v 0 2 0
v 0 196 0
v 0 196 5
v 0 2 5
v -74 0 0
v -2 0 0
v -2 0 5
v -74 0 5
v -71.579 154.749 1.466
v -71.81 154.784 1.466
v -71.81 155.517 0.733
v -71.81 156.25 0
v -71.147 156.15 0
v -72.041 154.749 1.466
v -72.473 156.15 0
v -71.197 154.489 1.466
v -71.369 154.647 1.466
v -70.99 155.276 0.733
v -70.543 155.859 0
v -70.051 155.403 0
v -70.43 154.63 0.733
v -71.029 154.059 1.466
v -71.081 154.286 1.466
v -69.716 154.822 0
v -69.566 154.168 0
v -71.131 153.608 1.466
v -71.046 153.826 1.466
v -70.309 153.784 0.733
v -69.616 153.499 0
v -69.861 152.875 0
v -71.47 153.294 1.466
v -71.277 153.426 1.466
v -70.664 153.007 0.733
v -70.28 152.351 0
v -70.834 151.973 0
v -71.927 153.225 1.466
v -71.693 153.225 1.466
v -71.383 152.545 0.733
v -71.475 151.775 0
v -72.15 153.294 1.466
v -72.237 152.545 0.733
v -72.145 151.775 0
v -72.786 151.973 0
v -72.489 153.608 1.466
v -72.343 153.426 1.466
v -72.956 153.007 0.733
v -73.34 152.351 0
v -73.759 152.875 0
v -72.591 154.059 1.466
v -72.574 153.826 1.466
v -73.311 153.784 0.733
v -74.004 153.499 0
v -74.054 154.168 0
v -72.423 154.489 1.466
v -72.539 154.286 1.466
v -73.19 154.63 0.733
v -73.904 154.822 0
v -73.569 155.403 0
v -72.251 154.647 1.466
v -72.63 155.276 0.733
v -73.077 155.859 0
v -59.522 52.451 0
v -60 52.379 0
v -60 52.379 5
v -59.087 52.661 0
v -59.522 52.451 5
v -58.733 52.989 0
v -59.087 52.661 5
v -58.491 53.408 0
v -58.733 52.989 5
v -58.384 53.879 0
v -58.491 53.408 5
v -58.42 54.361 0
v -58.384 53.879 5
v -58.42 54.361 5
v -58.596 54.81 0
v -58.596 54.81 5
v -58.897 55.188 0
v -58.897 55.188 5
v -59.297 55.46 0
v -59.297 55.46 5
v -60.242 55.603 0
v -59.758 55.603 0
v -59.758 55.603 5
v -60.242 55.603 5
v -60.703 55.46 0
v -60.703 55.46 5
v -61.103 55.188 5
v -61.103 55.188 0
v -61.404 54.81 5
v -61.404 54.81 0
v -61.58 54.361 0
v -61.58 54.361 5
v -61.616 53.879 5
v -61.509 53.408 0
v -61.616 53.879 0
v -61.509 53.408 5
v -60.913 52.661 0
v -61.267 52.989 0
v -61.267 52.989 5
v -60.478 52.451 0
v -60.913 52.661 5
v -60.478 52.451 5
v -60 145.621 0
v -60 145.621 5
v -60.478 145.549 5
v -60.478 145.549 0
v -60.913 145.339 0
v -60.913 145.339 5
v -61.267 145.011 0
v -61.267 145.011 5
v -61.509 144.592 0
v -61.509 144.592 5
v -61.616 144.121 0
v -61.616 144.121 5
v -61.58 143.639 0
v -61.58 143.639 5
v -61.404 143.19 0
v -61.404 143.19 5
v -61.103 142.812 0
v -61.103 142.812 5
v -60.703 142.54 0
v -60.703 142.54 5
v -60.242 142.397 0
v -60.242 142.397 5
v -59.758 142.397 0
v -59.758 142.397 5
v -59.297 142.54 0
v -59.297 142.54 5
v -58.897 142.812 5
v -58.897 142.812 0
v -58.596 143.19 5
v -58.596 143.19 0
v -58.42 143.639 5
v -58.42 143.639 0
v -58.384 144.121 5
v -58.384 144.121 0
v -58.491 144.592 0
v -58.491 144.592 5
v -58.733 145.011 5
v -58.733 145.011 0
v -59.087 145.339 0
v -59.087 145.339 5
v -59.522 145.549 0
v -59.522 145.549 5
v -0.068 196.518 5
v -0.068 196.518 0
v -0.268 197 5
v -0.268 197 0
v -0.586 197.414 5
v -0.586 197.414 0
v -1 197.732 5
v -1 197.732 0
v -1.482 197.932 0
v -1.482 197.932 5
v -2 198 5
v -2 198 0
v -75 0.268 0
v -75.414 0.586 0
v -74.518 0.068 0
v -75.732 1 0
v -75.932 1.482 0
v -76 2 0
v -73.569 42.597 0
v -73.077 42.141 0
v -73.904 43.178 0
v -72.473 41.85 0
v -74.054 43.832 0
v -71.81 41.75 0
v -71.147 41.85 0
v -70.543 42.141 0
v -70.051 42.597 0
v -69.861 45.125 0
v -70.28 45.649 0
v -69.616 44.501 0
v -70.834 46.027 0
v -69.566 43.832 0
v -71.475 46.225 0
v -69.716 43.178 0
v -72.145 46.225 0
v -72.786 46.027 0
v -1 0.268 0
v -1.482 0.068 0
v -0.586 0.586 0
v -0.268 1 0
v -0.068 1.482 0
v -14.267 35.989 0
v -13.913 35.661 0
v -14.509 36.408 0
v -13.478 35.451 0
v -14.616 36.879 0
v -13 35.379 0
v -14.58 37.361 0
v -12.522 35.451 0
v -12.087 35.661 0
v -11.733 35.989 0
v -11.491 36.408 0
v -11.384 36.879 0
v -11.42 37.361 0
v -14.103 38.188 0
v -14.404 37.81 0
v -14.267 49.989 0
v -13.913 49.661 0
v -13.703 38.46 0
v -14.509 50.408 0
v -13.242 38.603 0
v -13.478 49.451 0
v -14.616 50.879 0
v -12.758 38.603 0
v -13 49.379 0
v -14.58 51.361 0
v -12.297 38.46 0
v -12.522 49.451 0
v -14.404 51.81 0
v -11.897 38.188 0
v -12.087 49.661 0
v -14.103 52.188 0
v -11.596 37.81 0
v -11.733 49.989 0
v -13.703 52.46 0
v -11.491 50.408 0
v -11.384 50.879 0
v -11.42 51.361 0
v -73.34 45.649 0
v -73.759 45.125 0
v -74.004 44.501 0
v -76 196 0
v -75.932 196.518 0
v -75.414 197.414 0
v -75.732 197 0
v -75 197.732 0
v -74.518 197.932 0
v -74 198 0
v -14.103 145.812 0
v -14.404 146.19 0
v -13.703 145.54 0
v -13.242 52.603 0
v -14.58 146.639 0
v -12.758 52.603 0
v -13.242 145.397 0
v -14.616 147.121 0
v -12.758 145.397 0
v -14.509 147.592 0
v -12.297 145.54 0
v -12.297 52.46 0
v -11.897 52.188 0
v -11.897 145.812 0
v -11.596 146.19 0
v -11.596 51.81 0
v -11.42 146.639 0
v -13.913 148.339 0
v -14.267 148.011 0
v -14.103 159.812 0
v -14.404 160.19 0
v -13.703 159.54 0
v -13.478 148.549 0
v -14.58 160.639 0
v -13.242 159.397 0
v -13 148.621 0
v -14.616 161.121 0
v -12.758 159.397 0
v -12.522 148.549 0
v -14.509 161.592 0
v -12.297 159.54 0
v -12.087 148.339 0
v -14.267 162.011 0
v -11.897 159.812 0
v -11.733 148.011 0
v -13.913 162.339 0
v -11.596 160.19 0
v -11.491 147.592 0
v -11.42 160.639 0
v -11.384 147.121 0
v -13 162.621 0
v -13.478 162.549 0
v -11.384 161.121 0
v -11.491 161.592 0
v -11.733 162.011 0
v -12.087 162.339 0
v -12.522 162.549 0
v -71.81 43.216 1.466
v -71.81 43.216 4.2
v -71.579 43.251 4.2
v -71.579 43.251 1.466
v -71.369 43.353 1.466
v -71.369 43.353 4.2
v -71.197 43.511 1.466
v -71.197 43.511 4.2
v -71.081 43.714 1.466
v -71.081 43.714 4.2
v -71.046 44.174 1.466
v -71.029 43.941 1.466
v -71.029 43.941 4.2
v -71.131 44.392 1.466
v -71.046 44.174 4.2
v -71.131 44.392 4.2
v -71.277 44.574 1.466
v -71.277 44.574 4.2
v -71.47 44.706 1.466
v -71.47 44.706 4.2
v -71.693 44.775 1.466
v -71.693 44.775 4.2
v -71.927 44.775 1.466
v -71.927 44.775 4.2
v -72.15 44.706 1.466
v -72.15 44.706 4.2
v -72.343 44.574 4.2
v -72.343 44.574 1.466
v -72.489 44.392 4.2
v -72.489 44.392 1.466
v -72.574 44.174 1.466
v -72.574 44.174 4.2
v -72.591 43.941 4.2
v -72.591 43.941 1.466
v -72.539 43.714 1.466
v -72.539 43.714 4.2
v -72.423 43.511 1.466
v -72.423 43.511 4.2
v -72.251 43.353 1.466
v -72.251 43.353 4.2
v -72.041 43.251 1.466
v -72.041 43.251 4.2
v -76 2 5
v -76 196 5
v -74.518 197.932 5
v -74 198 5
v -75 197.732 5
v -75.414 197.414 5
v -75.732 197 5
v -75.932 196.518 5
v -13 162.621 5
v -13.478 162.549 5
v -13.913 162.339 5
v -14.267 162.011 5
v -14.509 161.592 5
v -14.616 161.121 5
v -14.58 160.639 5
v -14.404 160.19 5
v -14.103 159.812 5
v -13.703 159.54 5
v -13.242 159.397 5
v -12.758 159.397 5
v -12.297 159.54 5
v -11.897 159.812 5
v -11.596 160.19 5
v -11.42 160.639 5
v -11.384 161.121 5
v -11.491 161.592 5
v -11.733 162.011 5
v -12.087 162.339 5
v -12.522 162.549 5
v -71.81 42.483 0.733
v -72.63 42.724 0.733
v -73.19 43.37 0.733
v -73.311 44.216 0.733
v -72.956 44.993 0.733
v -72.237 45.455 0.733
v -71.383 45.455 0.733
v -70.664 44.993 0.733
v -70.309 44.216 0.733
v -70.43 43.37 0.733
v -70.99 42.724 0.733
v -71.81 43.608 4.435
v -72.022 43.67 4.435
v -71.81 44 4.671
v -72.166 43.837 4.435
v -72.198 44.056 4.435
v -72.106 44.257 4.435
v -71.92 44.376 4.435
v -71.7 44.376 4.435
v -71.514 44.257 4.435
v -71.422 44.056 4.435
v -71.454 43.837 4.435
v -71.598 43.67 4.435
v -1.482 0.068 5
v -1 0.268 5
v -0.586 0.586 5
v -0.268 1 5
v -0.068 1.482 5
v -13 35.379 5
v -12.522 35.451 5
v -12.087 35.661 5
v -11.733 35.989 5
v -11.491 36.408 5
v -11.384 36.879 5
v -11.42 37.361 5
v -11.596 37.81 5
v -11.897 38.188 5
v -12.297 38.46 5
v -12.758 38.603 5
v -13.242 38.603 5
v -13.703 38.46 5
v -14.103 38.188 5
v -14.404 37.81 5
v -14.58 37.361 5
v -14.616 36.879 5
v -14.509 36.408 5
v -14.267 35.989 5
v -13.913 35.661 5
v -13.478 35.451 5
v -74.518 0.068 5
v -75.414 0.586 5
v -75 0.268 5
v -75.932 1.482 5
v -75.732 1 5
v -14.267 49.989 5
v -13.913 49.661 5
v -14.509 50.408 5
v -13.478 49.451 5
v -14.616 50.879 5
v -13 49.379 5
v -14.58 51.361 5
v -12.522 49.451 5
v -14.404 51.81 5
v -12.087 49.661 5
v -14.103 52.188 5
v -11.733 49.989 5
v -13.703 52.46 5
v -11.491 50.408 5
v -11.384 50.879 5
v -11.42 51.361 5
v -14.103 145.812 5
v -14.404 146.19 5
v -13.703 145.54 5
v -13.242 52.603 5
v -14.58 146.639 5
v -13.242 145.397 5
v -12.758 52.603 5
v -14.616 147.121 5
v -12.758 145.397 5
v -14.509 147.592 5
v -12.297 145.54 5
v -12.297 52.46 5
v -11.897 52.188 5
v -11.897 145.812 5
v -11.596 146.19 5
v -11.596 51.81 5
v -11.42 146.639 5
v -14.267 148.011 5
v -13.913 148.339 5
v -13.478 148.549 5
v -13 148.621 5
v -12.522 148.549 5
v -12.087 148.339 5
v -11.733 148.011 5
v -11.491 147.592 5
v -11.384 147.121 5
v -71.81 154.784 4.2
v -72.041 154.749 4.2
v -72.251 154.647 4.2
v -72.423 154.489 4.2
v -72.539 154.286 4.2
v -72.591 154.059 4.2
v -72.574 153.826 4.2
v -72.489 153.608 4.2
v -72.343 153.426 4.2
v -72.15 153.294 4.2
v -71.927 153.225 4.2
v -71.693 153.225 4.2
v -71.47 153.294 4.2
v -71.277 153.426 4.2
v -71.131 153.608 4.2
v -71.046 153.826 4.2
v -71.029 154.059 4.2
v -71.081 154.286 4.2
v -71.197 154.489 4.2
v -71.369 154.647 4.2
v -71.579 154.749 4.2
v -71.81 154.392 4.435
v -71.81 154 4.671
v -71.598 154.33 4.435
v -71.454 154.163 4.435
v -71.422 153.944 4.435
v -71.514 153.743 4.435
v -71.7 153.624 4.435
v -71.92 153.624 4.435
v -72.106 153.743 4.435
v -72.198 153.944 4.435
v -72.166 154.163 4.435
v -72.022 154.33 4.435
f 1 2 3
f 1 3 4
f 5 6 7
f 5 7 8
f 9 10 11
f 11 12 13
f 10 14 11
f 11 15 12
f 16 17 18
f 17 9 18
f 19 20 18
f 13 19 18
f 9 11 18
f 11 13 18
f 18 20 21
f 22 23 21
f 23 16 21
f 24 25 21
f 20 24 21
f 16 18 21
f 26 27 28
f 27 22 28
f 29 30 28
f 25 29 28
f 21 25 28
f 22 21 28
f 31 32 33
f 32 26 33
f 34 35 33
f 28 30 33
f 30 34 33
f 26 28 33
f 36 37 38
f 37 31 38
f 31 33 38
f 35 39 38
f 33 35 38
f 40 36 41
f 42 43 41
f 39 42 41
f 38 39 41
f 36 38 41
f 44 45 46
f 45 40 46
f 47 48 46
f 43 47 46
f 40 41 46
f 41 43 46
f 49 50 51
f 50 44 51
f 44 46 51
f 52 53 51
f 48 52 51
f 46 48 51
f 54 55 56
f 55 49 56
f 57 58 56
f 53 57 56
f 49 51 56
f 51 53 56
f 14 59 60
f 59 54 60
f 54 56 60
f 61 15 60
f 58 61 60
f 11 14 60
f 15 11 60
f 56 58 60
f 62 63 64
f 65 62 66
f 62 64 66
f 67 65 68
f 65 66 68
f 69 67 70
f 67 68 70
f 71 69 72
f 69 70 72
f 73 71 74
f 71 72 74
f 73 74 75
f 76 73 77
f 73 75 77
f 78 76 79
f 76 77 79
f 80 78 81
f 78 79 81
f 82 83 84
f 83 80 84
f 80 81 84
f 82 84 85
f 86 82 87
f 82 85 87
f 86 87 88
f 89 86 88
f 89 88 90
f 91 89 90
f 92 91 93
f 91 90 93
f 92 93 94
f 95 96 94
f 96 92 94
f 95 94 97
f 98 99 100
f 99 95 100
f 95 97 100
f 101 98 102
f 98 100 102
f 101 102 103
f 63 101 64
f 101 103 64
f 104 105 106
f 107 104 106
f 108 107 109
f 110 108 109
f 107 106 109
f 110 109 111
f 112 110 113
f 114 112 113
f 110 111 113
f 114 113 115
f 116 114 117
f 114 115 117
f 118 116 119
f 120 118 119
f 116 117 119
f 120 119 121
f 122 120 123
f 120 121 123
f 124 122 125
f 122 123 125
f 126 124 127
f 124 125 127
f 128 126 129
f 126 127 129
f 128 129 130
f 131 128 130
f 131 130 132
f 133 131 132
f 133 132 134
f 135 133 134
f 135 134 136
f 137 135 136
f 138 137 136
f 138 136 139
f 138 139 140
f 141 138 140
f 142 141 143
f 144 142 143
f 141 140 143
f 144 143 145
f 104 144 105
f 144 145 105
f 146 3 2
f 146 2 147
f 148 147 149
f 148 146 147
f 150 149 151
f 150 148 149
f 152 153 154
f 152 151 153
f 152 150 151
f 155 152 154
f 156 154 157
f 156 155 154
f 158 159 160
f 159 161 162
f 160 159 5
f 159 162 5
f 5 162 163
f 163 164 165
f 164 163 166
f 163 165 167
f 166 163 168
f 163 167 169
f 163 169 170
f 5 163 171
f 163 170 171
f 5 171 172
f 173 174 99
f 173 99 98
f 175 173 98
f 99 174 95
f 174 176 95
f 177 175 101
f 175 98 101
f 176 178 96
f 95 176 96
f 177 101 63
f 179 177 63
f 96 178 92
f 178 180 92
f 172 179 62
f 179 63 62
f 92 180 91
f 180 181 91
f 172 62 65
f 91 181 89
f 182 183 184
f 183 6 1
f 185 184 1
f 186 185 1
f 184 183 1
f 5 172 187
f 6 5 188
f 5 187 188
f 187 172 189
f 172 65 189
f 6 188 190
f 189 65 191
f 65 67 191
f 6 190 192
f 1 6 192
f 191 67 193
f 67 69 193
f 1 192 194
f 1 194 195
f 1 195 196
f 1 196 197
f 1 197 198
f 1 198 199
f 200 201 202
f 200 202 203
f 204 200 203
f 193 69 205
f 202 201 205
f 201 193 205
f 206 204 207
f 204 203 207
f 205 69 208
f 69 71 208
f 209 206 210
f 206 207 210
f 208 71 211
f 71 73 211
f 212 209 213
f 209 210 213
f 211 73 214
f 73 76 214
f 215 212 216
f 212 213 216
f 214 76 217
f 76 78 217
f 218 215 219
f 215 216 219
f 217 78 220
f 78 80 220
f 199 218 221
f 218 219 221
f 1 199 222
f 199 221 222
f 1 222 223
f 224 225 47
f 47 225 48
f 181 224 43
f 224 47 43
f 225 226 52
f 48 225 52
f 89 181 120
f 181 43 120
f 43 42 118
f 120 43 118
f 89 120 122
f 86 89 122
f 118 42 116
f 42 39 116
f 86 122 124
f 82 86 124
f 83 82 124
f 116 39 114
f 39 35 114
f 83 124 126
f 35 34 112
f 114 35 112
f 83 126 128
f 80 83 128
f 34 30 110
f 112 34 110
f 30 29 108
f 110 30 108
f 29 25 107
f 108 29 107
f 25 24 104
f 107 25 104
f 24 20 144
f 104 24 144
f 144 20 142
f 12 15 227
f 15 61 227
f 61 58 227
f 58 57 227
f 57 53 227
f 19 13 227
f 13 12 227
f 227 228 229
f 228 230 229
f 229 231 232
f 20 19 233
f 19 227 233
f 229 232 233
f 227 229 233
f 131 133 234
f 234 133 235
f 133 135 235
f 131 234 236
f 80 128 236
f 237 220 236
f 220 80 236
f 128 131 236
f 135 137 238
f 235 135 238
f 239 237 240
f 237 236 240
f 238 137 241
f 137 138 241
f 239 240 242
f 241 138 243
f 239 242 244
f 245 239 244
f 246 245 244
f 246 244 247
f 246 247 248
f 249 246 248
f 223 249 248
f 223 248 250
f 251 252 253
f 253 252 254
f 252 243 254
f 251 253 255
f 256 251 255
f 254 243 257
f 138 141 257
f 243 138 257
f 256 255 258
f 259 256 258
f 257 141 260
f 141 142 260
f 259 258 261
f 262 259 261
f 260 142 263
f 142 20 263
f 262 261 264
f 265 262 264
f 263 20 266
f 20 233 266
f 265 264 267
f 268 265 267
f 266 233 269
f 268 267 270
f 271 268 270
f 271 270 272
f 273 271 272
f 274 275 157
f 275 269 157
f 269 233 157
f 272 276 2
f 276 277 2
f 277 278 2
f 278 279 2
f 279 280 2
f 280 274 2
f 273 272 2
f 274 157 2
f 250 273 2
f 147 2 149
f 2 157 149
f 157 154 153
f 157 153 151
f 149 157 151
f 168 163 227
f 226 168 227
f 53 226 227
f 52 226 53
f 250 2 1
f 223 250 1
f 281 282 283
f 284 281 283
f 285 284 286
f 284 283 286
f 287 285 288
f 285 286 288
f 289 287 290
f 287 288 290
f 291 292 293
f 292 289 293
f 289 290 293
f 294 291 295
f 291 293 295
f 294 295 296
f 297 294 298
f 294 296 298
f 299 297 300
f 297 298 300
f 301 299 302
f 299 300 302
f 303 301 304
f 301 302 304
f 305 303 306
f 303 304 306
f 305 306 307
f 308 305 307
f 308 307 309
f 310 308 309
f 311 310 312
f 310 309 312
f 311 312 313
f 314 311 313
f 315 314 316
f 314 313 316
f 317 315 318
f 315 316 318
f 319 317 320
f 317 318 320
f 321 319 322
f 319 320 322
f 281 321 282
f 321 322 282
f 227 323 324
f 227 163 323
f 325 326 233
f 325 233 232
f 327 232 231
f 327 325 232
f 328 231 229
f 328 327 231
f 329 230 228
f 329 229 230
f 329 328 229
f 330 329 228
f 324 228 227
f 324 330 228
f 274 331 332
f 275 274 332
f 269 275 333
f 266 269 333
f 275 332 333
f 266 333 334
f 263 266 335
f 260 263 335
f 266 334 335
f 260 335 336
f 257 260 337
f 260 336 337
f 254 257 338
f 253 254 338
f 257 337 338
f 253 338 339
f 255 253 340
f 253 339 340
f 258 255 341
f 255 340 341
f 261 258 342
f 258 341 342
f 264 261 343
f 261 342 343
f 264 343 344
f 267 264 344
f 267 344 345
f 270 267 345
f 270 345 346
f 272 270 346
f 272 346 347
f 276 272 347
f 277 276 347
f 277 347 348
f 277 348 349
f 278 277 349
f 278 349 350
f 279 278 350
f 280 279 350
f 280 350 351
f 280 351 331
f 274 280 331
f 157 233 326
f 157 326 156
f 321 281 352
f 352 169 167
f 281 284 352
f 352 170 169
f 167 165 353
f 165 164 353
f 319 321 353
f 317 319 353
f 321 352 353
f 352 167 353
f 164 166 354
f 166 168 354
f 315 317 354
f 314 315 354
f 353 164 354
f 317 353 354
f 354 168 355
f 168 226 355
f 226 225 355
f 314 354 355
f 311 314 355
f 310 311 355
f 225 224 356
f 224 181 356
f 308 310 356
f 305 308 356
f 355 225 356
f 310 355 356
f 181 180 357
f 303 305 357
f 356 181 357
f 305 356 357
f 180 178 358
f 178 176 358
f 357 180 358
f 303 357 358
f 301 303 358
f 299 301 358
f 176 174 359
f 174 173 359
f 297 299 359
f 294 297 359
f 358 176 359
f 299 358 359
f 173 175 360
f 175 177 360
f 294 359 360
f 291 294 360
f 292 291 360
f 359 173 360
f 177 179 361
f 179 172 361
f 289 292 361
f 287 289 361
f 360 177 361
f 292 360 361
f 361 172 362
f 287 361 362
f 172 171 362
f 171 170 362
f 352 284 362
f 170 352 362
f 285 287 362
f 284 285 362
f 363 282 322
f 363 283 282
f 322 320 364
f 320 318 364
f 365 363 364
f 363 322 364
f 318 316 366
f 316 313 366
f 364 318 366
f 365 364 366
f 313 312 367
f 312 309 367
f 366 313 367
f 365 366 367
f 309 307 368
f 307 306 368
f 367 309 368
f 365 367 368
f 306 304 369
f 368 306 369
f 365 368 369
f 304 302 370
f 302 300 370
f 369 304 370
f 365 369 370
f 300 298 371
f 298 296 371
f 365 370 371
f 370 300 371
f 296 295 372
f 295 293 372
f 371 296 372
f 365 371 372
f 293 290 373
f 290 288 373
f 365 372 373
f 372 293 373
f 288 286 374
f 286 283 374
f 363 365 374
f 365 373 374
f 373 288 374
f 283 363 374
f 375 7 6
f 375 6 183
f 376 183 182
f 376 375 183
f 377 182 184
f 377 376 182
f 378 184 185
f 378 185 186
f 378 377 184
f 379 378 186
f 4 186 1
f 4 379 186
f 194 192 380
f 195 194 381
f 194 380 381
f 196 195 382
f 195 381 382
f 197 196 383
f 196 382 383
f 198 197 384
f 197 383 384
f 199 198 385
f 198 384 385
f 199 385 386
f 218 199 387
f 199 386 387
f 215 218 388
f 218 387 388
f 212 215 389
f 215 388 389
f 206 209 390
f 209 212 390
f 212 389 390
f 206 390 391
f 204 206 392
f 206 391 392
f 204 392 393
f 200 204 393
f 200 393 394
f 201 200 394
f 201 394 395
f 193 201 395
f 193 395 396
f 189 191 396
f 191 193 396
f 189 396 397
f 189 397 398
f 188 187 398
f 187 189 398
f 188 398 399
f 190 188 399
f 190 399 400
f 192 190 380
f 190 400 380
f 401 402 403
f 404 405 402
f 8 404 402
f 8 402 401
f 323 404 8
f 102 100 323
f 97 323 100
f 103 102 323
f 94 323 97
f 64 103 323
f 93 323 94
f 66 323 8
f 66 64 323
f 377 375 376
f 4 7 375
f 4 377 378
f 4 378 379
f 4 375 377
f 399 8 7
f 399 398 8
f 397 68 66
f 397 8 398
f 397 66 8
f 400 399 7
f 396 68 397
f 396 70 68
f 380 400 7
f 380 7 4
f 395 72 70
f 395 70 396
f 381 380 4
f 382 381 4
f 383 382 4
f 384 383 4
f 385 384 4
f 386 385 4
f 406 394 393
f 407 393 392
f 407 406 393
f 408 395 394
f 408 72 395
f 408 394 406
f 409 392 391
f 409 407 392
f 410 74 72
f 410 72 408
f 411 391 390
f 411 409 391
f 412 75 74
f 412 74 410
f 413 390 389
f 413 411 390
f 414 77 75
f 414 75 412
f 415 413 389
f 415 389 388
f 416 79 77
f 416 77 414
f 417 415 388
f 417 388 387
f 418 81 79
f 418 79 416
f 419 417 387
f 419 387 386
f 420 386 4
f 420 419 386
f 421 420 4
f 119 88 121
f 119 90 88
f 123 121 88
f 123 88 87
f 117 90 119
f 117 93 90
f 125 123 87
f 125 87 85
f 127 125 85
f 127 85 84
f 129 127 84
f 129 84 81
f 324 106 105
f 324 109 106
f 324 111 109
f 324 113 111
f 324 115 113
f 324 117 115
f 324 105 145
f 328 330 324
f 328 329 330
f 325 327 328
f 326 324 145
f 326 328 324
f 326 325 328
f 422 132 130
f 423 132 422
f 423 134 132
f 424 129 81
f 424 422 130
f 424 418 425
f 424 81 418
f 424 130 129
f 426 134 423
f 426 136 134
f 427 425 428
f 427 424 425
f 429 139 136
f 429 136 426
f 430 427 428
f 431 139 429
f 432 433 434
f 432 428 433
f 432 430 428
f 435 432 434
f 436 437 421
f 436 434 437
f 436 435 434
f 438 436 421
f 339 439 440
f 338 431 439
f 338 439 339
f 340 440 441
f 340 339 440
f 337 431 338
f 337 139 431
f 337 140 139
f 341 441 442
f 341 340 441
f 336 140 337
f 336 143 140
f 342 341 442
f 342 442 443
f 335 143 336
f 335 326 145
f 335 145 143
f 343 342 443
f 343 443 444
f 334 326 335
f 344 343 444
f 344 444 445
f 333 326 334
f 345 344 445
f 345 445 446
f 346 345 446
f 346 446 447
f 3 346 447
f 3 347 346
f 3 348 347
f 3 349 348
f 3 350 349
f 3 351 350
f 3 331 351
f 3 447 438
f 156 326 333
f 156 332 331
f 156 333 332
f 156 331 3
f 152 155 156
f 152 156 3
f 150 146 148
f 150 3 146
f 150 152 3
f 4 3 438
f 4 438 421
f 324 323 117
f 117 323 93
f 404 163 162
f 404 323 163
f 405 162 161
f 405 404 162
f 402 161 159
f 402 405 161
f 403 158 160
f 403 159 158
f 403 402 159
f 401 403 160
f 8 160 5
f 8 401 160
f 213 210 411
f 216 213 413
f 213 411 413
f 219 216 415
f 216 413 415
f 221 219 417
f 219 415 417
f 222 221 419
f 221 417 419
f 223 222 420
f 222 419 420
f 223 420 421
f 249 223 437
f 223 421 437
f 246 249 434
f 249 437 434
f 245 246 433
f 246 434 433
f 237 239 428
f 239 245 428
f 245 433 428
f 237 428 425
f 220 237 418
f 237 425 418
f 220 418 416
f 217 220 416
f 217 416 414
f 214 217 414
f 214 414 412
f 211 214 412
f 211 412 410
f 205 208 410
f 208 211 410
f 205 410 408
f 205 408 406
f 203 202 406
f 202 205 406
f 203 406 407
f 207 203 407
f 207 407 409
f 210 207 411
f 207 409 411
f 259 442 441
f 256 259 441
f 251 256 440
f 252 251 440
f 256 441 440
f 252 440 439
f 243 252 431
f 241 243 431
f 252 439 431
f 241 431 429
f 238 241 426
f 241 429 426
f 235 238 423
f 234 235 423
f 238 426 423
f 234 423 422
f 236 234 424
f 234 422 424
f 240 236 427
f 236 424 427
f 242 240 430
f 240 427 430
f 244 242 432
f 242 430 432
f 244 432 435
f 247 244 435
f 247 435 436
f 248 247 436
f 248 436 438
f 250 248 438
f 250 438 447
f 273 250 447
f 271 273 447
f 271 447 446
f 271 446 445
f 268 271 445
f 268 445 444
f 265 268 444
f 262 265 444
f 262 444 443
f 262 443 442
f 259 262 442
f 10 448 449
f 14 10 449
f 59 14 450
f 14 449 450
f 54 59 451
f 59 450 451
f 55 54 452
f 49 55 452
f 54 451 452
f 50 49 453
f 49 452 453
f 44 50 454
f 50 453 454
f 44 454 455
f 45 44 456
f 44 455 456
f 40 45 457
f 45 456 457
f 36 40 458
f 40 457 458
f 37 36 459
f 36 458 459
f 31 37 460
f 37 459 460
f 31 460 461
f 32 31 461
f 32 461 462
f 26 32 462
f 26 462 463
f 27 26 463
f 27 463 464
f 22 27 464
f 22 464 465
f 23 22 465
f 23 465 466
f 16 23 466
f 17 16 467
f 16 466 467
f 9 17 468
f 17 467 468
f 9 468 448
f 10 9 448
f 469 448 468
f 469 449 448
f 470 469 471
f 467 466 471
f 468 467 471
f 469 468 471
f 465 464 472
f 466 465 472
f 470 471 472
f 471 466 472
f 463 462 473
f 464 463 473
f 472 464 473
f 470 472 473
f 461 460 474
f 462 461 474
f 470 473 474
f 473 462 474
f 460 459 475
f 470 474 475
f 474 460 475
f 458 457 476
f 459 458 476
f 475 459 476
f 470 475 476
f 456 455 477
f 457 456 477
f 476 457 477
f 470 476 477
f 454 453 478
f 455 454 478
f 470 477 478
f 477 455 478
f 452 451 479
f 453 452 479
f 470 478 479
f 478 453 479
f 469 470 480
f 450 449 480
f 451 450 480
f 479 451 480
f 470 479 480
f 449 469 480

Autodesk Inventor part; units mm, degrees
ref_plane "YZ Plane" through (0, 0, 0) normal (1, 0, 0) x (0, 1, 0)
ref_plane "XZ Plane" through (0, 0, 0) normal (0, 1, 0) x (-1, 0, 0)
sketch "Skizze3" plane through (0, 0, 0) normal (0, 0, 1) x (1, 0, 0)
  line L0 (0, 0) -> (-76, 0)
  line L1 (-76, 0) -> (-76, 198)
  line L2 (-76, 198) -> (0, 198)
  line L3 (0, 198) -> (0, 0)
  point P0 (-13, 161)
  point P1 (-13, 147)
  point P2 (-71.81, 154)
  point P3 (-60, 144)
  dimension "d4" = 198
  dimension "d5" = 76
  dimension "d9" = 37
  dimension "d10" = 51
  dimension "d11" = 13
  dimension "d12" = 13
  dimension "d13" = 71.81
  dimension "d14" = 44
  dimension "d15" = 60
  dimension "d16" = 54
extrude "Extrusion3" add sketch "Skizze3" along normal blind 5
fillet "Rundung1" radius 2 4 edges at (0, 198, 2.5) (-76, 198, 2.5) (-76, 0, 2.5) (0, 0, 2.5)
ref_plane "Arbeitsebene1" through (-76, 99, 0) normal (0, -1, 0) x (1, 0, 0)
hole "Bohrung1" at (-13, 161, 0) at (-13, 147, 0) at (-60, 144, 0) direction (0, 0, 1) diameter 3.242 end through all thread size "M4x0.7" class "6H" standard "ISO Metric profile"
hole "Bohrung2" at (-71.81, 154, 0) direction (0, 0, 1) diameter 1.567 depth 4.2 tip angle 118 countersink diameter 4.5 countersink angle 90 thread size "M2x0.4" class "6H" standard "ISO Metric profile"
mirror "Spiegeln1" about plane through (-76, 99, 0) normal (0, -1, 0) of "Bohrung2", "Bohrung1"
equation "\"d12\" = d11"
properties part number "BT703_trajan20_21" material "Acryl"
